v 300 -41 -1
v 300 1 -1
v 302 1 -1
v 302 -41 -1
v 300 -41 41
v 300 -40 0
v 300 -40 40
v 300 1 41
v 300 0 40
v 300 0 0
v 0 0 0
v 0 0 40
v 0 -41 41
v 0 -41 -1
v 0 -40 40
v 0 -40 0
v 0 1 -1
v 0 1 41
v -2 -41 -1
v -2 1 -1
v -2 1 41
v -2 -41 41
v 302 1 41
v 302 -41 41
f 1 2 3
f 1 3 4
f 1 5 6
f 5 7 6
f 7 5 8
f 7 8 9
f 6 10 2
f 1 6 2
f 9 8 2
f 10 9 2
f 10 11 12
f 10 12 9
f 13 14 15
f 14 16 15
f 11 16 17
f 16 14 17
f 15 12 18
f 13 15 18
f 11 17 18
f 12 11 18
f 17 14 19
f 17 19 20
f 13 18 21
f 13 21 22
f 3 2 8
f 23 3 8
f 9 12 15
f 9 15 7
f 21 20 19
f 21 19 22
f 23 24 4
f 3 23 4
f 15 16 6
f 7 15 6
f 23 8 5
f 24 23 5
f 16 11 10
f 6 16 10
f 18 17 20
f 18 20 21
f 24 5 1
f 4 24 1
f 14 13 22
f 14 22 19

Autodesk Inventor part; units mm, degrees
ref_plane "YZ Plane" through (0, 0, 0) normal (1, 0, 0) x (0, 1, 0)
ref_plane "XZ Plane" through (0, 0, 0) normal (0, 1, 0) x (-1, 0, 0)
ref_plane "XY Plane" through (0, 0, 0) normal (0, 0, 1) x (1, 0, 0)
sketch "Sketch1" plane through (0, 0, 0) normal (0, 0, 1) x (1, 0, 0)
  line L0 (0, 0) -> (300, 0)
  line L1 (0, 0) -> (0, -40)
  line L2 (0, -40) -> (300, -40)
  line L3 (300, -40) -> (300, 0)
  dimension "d0" = 300
  dimension "d1" = 40
extrude "Extrusion1" add sketch "Sketch1" along normal blind 40
sketch "Sketch2" plane through (300, -40, 0) normal (1, 0, 0) x (0, 0, -1)
  line L0 (1, 41) -> (-41, 41)
  line L1 (0, 40) -> (-40, 40) projected
  line L2 (1, 41) -> (1, -1)
  line L3 (-41, 41) -> (-41, -1)
  line L4 (-41, -1) -> (1, -1)
  line L5 (0, 0) -> (0, 40) projected
  dimension "d4" = 1
  dimension "d5" = 42
  dimension "d6" = 42
  dimension "d7" = 1
extrude "Extrusion2" add sketch "Sketch2" along normal blind 2
sketch "Sketch3" plane through (0, -40, 0) normal (-1, 0, 0) x (0, 0, 1)
  line L0 (-1, 41) -> (41, 41) projected
  line L1 (41, 41) -> (41, -1) projected
  line L2 (41, 41) -> (41, -1)
  line L3 (41, -1) -> (-1, -1) projected
  line L4 (41, -1) -> (-1, -1)
  line L5 (-1, -1) -> (-1, 41) projected
  line L6 (-1, -1) -> (-1, 41)
  line L7 (-1, 41) -> (41, 41)
  point P0 (0, 40)
extrude "Extrusion3" add sketch "Sketch3" along normal blind 2
properties part number "InoxLienKet"
